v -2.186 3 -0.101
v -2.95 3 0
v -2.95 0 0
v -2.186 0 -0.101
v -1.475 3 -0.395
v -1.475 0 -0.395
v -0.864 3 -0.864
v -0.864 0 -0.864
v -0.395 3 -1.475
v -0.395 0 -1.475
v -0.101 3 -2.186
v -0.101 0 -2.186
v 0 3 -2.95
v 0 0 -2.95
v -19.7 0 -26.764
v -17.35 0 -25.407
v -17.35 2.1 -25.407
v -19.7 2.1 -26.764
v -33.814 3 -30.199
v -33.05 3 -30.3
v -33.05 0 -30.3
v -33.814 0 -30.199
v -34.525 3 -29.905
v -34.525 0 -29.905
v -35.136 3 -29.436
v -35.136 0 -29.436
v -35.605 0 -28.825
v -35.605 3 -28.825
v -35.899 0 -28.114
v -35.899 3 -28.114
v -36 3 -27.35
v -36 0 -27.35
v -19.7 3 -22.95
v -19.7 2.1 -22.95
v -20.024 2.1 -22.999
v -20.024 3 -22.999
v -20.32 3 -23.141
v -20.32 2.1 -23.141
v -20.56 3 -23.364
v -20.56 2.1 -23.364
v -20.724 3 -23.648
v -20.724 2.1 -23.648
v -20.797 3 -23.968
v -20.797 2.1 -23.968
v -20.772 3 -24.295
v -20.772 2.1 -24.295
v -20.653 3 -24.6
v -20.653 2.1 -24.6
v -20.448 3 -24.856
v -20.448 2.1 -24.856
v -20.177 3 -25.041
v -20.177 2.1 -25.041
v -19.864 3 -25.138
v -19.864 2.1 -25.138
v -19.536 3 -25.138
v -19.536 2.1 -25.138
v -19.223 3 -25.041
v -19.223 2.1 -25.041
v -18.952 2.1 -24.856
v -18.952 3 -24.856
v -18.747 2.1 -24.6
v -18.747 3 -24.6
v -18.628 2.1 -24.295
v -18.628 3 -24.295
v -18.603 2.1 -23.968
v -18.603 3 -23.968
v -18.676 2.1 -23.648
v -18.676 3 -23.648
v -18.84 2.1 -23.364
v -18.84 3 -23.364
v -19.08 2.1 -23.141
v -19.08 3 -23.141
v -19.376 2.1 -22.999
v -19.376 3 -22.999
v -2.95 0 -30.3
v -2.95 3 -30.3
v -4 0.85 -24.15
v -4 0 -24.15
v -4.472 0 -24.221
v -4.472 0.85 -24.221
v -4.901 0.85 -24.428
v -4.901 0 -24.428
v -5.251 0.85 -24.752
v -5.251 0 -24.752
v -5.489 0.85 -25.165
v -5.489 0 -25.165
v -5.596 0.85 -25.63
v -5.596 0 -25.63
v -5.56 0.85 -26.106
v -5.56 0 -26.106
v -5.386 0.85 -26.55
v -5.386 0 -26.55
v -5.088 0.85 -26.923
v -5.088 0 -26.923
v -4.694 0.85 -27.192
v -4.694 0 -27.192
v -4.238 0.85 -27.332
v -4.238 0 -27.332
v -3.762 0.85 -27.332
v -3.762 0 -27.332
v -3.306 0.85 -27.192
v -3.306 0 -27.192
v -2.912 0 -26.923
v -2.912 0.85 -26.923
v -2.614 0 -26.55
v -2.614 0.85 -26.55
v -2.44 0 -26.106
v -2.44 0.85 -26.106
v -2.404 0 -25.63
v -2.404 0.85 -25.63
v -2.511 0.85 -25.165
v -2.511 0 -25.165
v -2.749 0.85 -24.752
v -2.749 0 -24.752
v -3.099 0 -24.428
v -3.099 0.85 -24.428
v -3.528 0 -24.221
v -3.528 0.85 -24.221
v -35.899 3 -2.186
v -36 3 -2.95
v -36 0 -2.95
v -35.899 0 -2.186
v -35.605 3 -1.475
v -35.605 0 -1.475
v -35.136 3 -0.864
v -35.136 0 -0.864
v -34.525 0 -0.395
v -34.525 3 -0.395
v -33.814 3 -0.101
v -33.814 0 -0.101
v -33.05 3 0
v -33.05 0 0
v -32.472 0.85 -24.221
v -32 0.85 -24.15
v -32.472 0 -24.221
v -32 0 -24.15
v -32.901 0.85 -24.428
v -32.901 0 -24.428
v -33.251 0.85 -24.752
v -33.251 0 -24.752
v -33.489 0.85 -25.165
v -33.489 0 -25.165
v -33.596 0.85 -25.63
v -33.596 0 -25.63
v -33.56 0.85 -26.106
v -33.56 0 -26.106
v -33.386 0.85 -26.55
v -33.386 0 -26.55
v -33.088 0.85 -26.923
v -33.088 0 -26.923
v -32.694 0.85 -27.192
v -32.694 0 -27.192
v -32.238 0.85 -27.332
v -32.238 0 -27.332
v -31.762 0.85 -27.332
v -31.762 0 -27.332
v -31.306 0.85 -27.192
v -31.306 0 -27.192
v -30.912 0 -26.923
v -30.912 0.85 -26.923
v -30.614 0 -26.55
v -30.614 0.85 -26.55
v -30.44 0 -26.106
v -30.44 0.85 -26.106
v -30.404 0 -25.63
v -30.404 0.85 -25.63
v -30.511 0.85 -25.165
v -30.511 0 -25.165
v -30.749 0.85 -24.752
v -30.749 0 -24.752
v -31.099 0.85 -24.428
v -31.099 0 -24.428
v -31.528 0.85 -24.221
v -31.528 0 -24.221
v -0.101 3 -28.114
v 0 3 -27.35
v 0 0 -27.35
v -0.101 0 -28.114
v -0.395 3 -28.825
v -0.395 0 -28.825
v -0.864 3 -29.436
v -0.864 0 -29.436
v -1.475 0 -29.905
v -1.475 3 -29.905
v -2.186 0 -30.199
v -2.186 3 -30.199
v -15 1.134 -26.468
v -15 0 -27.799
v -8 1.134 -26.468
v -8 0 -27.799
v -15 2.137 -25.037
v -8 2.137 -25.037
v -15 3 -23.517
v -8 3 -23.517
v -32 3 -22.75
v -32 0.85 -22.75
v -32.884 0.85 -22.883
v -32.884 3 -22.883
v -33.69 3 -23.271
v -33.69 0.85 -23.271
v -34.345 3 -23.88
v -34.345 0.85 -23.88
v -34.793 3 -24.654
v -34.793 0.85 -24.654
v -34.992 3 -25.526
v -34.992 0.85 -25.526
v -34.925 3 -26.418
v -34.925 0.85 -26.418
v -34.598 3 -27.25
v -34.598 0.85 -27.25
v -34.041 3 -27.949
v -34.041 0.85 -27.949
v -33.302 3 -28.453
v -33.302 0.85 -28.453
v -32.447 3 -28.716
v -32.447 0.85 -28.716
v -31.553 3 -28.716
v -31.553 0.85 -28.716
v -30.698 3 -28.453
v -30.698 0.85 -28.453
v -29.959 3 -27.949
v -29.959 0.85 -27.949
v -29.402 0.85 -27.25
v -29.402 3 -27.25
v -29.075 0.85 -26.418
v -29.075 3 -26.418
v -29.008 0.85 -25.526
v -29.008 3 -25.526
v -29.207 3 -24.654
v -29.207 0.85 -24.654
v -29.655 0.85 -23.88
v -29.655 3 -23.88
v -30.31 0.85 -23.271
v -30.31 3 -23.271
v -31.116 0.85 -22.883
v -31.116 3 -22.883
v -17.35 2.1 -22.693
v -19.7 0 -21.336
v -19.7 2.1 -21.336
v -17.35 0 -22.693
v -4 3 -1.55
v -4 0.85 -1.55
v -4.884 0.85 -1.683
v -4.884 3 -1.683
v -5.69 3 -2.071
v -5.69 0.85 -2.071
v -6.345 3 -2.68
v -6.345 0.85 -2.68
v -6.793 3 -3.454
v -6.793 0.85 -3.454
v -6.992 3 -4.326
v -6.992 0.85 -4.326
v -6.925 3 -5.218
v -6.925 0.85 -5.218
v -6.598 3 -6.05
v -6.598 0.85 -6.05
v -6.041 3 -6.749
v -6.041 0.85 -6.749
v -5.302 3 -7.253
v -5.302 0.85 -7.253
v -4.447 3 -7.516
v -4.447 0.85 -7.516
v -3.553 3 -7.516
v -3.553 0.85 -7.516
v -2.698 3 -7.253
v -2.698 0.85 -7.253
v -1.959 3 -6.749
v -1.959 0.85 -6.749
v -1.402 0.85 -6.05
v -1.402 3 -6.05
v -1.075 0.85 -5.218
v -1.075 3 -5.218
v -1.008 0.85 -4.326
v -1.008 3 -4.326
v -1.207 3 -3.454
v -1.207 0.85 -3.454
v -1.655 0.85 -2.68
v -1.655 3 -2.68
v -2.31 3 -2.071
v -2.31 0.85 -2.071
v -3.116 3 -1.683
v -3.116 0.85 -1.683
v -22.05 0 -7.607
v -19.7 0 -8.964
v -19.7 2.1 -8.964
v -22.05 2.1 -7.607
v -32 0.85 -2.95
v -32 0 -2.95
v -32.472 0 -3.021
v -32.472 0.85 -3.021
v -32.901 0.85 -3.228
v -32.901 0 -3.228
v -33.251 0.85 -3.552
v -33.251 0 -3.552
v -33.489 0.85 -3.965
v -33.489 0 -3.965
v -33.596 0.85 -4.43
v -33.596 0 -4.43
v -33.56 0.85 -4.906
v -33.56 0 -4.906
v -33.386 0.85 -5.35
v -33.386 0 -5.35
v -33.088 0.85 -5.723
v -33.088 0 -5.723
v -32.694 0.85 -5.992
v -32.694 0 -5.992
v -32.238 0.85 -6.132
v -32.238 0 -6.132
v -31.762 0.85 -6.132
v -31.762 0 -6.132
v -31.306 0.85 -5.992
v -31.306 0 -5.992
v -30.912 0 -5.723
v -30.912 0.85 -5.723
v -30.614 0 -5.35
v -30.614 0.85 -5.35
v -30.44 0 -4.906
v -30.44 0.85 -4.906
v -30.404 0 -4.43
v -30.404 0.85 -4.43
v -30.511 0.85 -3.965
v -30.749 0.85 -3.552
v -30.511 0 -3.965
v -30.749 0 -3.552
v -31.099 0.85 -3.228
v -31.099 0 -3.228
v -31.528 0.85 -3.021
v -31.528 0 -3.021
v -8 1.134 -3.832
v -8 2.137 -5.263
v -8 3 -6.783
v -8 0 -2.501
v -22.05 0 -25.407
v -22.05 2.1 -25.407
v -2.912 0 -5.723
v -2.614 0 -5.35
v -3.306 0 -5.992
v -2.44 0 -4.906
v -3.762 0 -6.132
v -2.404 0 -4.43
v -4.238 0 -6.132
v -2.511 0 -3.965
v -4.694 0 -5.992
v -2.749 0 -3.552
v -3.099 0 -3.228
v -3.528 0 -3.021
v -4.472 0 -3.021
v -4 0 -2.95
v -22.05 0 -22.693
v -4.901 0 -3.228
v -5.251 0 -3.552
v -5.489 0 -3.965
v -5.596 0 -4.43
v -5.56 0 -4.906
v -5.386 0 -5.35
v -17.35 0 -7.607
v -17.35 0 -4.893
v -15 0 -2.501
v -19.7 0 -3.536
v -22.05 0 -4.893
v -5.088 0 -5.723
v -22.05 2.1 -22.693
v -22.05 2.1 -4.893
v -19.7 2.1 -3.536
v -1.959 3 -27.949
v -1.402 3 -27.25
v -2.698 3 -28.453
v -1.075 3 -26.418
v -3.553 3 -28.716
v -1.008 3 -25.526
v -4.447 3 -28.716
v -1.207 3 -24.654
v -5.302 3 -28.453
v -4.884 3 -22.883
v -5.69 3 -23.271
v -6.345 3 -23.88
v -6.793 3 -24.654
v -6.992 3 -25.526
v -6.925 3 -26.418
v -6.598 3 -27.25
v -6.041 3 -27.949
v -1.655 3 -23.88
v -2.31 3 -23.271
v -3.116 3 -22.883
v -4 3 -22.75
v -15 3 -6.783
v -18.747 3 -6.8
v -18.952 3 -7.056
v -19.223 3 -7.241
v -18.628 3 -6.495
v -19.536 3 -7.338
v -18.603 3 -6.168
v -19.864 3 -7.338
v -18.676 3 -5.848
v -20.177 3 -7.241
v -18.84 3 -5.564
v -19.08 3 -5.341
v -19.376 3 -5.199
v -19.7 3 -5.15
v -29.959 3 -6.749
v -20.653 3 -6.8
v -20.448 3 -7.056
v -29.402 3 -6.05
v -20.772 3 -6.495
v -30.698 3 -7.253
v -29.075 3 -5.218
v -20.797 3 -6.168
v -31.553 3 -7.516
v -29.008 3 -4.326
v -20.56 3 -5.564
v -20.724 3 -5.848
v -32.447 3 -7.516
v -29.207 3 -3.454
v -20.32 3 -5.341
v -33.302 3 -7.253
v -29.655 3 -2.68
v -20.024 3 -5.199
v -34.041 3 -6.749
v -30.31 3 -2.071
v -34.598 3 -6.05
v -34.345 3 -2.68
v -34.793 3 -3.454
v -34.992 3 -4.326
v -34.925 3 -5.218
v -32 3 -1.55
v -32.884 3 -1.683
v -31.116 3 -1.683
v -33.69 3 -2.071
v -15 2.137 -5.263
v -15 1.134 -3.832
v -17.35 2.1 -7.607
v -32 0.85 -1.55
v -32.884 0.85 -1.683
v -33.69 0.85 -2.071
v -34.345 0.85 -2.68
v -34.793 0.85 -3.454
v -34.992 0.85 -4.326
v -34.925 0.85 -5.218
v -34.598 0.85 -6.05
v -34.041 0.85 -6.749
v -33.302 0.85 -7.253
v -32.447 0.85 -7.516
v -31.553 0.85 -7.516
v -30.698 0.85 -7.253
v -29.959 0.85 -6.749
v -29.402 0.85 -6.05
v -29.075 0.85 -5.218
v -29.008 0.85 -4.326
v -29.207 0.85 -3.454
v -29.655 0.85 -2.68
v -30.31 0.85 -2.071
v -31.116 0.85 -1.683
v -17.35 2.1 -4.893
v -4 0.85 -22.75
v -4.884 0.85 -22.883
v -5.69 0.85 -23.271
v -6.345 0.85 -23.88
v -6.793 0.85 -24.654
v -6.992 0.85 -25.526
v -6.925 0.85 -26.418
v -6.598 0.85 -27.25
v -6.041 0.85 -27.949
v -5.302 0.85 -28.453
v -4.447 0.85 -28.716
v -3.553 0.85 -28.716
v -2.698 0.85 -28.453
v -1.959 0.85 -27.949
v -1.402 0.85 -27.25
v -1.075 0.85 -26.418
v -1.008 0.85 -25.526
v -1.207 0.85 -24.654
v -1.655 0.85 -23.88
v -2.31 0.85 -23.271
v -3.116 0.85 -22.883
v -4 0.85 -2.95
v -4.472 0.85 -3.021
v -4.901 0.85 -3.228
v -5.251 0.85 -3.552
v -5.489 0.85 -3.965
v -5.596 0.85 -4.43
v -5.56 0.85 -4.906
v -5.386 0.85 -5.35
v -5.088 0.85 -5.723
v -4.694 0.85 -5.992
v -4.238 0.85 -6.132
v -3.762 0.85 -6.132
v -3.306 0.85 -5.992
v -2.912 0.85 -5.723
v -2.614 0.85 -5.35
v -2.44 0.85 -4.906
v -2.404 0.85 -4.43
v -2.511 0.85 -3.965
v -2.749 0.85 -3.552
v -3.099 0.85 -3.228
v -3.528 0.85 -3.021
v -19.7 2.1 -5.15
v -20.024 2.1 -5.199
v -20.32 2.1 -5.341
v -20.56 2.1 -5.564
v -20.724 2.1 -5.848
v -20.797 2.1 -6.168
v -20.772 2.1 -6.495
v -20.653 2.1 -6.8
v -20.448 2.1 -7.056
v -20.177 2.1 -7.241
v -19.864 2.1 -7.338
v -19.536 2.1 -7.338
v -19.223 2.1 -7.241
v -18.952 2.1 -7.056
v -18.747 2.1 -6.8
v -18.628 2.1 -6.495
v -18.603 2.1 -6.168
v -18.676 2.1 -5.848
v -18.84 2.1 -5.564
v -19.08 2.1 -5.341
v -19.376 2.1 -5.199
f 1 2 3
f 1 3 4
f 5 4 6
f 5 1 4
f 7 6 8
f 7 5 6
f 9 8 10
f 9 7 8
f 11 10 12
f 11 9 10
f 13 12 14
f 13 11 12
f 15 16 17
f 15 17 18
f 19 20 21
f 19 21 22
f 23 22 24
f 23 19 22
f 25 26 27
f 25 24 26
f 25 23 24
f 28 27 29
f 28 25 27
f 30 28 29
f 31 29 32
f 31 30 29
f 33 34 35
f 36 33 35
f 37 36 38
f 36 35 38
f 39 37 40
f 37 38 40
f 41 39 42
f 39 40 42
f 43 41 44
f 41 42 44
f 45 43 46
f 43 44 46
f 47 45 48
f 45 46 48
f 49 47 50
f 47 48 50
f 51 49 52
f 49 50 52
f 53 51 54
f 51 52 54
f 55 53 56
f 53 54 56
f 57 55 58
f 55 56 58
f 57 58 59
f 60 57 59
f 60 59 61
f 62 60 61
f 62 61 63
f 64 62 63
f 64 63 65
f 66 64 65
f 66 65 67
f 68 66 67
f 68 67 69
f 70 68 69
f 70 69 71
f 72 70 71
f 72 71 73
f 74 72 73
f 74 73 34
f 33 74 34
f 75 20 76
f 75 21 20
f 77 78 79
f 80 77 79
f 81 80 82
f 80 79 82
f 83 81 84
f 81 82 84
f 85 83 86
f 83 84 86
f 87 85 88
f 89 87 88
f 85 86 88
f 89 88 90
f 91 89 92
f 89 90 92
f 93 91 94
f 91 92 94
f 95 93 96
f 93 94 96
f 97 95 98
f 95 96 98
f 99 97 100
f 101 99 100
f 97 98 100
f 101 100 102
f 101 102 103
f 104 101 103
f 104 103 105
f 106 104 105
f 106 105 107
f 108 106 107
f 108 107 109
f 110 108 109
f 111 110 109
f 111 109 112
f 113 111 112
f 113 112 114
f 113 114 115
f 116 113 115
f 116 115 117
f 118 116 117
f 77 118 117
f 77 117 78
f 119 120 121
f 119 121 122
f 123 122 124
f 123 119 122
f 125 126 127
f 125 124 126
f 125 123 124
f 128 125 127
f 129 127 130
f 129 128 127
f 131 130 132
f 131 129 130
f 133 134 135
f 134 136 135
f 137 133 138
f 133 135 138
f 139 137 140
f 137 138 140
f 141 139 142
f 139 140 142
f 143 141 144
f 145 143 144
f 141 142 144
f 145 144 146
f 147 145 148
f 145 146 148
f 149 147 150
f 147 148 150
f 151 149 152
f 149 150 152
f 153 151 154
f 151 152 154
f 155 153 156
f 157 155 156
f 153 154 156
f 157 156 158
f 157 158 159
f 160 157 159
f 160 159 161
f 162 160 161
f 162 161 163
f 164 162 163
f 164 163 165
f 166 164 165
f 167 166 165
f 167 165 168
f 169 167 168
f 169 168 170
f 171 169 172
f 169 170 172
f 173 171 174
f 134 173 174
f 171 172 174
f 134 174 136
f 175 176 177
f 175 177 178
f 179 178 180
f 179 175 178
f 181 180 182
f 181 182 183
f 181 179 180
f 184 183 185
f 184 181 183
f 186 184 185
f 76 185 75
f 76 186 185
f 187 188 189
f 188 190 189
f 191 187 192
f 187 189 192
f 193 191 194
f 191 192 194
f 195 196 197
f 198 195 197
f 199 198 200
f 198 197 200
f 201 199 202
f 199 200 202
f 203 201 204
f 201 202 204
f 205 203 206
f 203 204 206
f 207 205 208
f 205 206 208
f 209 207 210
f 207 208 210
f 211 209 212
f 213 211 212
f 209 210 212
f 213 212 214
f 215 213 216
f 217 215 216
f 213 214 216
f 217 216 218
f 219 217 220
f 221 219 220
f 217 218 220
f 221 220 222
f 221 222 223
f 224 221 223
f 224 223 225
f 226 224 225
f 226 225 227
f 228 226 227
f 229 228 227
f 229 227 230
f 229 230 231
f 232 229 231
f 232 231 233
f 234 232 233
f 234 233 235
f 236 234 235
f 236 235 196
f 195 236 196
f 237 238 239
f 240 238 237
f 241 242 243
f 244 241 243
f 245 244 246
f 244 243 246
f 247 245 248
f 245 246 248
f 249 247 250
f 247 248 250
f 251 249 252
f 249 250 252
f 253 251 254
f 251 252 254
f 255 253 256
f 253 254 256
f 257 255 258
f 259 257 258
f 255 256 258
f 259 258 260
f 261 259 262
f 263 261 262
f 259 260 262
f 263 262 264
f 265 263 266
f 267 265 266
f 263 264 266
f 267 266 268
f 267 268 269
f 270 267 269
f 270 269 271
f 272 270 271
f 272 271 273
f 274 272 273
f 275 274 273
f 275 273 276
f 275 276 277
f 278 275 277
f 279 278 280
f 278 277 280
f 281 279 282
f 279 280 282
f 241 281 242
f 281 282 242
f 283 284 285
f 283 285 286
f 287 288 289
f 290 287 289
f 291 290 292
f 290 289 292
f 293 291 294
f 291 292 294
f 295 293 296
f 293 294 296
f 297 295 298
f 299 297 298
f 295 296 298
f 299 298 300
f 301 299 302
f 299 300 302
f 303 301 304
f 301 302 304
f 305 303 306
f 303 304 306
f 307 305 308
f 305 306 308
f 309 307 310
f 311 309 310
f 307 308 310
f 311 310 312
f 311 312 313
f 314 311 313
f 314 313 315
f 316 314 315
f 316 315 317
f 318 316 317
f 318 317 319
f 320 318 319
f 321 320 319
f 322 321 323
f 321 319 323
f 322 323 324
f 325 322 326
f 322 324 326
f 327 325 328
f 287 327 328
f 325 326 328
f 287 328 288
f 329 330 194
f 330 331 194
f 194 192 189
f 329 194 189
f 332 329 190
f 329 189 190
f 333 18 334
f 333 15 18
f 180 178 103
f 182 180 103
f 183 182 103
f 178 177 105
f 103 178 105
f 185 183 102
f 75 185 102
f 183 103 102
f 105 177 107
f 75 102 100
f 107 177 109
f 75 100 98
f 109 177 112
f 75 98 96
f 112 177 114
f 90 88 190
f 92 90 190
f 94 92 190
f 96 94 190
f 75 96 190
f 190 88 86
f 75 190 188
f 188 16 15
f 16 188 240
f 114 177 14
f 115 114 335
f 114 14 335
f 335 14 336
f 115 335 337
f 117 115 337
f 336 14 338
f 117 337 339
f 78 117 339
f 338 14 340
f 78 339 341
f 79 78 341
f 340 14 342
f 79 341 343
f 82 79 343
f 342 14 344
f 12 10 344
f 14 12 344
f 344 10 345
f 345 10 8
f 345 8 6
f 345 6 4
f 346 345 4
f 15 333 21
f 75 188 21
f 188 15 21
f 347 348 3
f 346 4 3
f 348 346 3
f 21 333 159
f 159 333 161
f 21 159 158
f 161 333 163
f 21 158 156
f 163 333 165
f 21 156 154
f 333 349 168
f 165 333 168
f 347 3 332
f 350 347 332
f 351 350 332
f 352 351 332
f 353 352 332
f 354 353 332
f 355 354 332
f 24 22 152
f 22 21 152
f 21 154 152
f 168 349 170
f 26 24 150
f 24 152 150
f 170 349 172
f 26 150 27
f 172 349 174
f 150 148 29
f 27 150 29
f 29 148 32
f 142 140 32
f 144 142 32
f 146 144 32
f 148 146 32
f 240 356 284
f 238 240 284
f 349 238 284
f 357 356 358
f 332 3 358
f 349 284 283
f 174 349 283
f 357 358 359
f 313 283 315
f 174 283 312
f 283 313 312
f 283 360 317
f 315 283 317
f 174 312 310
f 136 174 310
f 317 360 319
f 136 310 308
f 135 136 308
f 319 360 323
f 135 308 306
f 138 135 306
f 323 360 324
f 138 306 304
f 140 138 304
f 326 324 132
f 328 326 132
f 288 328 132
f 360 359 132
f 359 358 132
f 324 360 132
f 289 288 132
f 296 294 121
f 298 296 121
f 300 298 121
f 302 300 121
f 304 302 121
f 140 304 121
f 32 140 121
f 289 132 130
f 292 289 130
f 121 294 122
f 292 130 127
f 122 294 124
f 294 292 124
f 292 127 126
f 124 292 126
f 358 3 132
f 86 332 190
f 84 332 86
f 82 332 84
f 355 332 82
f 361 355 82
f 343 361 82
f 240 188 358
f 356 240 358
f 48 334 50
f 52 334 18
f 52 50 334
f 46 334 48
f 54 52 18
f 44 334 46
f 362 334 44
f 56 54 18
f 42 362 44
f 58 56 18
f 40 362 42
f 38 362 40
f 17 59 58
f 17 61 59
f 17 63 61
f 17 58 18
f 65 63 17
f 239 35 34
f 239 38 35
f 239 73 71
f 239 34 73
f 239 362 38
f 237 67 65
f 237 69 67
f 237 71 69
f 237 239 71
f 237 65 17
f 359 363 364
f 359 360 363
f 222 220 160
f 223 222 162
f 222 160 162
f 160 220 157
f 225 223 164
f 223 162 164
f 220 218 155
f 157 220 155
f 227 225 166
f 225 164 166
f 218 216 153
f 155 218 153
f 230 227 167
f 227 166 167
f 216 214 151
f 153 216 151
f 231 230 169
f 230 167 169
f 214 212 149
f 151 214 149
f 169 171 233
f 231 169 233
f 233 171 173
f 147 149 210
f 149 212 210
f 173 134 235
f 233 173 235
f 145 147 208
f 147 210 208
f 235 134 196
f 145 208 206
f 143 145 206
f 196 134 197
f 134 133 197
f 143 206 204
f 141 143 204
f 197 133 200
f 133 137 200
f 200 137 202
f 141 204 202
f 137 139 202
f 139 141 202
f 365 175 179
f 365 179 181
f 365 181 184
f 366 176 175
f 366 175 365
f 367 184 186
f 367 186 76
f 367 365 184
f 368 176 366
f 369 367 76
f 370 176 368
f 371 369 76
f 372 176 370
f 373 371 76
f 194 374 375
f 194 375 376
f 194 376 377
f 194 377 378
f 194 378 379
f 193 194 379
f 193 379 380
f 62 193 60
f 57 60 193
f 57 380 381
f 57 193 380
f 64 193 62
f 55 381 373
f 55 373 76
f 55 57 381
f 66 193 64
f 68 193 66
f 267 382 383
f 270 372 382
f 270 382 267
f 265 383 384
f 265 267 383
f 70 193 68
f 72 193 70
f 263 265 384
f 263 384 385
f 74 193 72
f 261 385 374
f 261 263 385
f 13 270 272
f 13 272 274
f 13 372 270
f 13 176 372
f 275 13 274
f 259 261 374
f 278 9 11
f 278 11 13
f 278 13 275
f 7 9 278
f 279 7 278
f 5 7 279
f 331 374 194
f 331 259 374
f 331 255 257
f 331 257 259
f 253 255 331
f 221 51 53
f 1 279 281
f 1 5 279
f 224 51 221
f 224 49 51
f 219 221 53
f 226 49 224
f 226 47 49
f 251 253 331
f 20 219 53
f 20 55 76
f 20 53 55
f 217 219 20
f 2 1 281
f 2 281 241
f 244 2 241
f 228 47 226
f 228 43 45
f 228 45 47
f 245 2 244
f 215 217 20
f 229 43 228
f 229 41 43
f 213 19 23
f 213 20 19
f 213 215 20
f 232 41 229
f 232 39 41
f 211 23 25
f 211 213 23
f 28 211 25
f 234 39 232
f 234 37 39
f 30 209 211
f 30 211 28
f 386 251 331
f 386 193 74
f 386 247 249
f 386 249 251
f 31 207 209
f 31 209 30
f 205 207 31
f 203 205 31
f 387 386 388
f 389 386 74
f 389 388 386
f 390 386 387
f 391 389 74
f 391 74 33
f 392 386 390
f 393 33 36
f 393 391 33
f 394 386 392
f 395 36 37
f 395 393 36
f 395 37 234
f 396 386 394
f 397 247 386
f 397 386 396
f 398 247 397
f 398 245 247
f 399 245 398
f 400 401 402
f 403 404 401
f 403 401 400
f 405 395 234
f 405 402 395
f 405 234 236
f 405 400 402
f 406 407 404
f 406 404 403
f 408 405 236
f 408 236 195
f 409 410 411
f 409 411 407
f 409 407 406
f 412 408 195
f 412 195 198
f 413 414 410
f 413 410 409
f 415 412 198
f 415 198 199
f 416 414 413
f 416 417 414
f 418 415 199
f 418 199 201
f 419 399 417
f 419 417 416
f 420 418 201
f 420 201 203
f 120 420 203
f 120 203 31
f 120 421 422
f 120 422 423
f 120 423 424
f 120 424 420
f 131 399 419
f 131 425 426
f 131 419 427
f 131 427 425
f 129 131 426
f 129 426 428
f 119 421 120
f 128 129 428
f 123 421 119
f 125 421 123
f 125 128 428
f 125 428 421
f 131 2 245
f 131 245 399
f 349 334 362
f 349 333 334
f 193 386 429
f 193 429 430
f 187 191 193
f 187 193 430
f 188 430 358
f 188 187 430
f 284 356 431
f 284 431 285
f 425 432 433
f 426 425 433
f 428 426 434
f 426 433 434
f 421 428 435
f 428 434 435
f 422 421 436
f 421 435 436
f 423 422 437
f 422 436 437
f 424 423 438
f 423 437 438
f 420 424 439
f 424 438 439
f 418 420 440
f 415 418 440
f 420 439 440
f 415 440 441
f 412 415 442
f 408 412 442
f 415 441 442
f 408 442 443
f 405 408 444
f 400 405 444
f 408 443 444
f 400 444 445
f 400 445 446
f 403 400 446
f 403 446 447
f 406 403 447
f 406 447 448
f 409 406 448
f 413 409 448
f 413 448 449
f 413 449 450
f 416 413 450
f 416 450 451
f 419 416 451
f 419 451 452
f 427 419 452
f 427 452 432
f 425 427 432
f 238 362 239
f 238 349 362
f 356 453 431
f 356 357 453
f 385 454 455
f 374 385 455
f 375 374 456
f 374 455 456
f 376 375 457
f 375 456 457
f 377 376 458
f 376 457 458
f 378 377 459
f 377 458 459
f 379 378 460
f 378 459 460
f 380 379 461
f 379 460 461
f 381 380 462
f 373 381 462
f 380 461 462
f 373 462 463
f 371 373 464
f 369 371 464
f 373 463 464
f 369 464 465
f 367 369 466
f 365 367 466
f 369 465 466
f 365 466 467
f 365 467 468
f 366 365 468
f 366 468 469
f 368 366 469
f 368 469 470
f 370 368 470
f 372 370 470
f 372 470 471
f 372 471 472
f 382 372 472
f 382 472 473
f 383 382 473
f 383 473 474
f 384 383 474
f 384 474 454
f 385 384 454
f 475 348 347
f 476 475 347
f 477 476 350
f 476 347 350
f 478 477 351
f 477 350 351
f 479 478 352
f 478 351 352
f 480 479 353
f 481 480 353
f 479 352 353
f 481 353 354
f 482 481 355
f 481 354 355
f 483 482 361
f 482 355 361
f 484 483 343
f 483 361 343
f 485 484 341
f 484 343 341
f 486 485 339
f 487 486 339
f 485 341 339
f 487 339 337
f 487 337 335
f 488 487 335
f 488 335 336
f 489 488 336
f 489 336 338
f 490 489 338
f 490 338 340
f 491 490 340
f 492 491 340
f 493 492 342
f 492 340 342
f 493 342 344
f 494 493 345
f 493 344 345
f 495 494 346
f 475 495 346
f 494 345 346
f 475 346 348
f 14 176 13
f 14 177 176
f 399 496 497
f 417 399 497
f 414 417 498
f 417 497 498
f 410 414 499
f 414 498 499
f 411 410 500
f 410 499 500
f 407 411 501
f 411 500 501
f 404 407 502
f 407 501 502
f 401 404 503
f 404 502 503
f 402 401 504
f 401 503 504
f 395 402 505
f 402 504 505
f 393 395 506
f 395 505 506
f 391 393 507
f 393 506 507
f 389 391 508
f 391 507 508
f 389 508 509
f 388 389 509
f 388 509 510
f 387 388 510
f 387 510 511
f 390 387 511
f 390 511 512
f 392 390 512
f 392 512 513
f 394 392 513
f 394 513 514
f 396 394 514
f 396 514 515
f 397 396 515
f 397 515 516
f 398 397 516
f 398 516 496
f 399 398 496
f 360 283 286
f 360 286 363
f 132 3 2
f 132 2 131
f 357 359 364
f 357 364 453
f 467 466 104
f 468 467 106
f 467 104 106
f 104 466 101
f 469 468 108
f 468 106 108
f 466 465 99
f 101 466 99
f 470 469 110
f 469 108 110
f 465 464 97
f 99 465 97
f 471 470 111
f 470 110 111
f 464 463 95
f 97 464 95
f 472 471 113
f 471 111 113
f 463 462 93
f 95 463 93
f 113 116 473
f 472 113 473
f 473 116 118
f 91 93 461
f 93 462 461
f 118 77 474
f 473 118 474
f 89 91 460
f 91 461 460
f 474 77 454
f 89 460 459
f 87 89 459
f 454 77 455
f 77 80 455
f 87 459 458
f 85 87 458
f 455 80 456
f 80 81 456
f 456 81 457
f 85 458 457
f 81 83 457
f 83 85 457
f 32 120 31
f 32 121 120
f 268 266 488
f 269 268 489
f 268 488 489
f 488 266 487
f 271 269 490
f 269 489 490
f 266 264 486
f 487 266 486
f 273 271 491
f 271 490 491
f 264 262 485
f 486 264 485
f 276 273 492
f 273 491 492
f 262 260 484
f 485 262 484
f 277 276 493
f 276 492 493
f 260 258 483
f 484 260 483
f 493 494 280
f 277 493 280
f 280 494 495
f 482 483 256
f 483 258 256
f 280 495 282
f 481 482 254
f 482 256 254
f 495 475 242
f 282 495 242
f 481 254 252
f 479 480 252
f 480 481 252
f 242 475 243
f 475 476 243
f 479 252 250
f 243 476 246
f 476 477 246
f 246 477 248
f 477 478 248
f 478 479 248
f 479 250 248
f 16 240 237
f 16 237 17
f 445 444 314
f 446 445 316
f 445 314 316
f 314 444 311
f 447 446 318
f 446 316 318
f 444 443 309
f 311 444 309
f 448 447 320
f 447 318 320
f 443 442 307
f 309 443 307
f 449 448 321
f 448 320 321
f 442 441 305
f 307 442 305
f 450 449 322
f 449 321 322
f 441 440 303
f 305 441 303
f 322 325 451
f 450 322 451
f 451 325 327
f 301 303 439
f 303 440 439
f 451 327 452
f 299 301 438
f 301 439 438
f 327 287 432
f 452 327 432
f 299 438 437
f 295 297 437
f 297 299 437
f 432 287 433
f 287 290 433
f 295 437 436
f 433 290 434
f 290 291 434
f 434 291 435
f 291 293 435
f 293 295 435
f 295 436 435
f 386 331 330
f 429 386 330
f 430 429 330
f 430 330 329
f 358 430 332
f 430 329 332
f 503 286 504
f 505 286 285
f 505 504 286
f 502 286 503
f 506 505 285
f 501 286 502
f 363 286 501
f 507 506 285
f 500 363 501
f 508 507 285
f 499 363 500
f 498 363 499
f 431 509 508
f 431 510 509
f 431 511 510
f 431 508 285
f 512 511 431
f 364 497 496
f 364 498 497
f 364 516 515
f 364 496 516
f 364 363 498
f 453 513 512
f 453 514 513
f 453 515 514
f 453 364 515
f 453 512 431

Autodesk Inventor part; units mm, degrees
ref_plane "YZ Plane" through (0, 0, 0) normal (1, 0, 0) x (0, 1, 0)
ref_plane "XZ Plane" through (0, 0, 0) normal (0, 1, 0) x (-1, 0, 0)
sketch "Эскиз1" plane through (0, 0, 0) normal (0, 1, 0) x (-1, 0, 0)
  line L0 (0, 0) -> (36, 0)
  line L1 (36, 0) -> (36, -30.3)
  line L2 (36, -30.3) -> (0, -30.3)
  line L3 (0, -30.3) -> (0, 0)
  dimension "d0" = 36
  dimension "d1" = 30.3
extrude "Выдавливание1" add sketch "Эскиз1" along normal blind 3
sketch "Эскиз2" plane through (0, 3, 0) normal (0, 1, 0) x (1, 0, 0)
  line L0 (-36, 30.3) -> (-36, 0) projected
  line L1 (-36, 0) -> (-36, 4.55)
  line L2 (-36, 4.55) -> (-32, 4.55)
  line L3 (-36, 0) -> (0, 0) projected
  line L4 (-18, 0) -> (-18, 30.3)
  line L5 (0, 30.3) -> (-36, 30.3) projected
  line L6 (-36, 15.15) -> (0, 15.15)
  line L7 (0, 0) -> (0, 30.3) projected
  point P0 (-32, 25.75)
  point P1 (-4, 4.55)
  point P2 (-4, 25.75)
  dimension "d4" = 4.55
  dimension "d48" = 4
hole "Отверстие1" at (-32, 3, -4.55) at (-32, 3, -25.75) at (-4, 3, -25.75) at (-4, 3, -4.55) direction (0, -1, 0) diameter 3.2 end through all counterbore diameter 6 counterbore depth 2.15
fillet "Сопряжение1" radius 2.95 4 edges at (0, 1.5, 0) (0, 1.5, -30.3) (-36, 1.5, -30.3) (-36, 1.5, 0)
sketch "Эскиз4" plane through (0, 0, -2.95) normal (1, 0, 0) x (0, 0, -1)
  line L0 (12.2, 0) -> (12.2, -13.5)
  circle A0 centre (12.2, -13.5) radius 18.5
  line L1 (0, 0) -> (24.4, 0) projected
  line L2 (0, 0) -> (0, 3) projected
  line L3 (0, 1.5) -> (24.4, 1.5)
  line L4 (24.4, 3) -> (24.4, 0) projected
  dimension "d27" = 13.5
  dimension "d38" = 37
ref_plane "РабПлоскость1" through (-8, 0, -2.95) normal (1, 0, 0) x (0, 0, -1)
extrude "Выдавливание3" cut sketch "Эскиз4" against normal blind 7 from surface at -8 contours A0 L2 L1 L4 | L4 L1 L2 A0 L3 | L3 A0
sketch "Эскиз6" plane through (0, 3, 0) normal (0, 1, 0) x (1, 0, 0)
  line L0 (-15, 23.5166) -> (-15, 6.7834) projected
  line L1 (-15, 15.15) -> (-19.7, 15.15)
  line L2 (-19.7, 6.25) -> (-19.7, 24.05)
  point P0 (0, 0)
  dimension "d39" = 4.7
  dimension "d40" = 17.8
hole "Отверстие2" at (-19.7, 3, -6.25) at (-19.7, 3, -24.05) direction (0, -1, 0) diameter 2.2 end through all
sketch "Эскиз7" plane through (0, 0, 0) normal (0, -1, 0) x (1, 0, 0)
  circle A0 centre (-19.7, -6.25) radius 1.1 projected
  line L0 (-17.35, -7.6068) -> (-19.7, -8.9635)
  line L1 (-19.7, -8.9635) -> (-22.05, -7.6068)
  line L2 (-22.05, -7.6068) -> (-22.05, -4.8932)
  line L3 (-22.05, -4.8932) -> (-19.7, -3.5365)
  line L4 (-19.7, -3.5365) -> (-17.35, -4.8932)
  line L5 (-17.35, -4.8932) -> (-17.35, -7.6068)
  circle A1 centre (-19.7, -24.05) radius 1.1 projected
  line L6 (-17.35, -25.4068) -> (-19.7, -26.7635)
  line L7 (-19.7, -26.7635) -> (-22.05, -25.4068)
  line L8 (-22.05, -25.4068) -> (-22.05, -22.6932)
  line L9 (-22.05, -22.6932) -> (-19.7, -21.3365)
  line L10 (-19.7, -21.3365) -> (-17.35, -22.6932)
  line L11 (-17.35, -22.6932) -> (-17.35, -25.4068)
  line L12 (-15, -2.5009) -> (-15, -27.7991) projected
  point P0 (0, 0)
  dimension "d49" = 4.7
extrude "Выдавливание4" cut sketch "Эскиз7" against normal blind 2.1
equation "\"Радиус_гибки\" = Толщина"
equation "\"Ширина_просечки\" = Толщина"
equation "\"Глубина_просечки\" = 0.5 * Толщина"
equation "\"Размер_просечки\" = 4 * Толщина"
equation "\"Мин_остаток\" = 2 * Толщина"
equation "\"Радиус_перехода\" = Радиус_гибки"
equation "\"Радиус_Якоби\" = Толщина"
equation "\"Размер_зазора\" = Толщина"
equation "\"Толщина\" = 0.5"
properties part number "Крепление двигателя2"
